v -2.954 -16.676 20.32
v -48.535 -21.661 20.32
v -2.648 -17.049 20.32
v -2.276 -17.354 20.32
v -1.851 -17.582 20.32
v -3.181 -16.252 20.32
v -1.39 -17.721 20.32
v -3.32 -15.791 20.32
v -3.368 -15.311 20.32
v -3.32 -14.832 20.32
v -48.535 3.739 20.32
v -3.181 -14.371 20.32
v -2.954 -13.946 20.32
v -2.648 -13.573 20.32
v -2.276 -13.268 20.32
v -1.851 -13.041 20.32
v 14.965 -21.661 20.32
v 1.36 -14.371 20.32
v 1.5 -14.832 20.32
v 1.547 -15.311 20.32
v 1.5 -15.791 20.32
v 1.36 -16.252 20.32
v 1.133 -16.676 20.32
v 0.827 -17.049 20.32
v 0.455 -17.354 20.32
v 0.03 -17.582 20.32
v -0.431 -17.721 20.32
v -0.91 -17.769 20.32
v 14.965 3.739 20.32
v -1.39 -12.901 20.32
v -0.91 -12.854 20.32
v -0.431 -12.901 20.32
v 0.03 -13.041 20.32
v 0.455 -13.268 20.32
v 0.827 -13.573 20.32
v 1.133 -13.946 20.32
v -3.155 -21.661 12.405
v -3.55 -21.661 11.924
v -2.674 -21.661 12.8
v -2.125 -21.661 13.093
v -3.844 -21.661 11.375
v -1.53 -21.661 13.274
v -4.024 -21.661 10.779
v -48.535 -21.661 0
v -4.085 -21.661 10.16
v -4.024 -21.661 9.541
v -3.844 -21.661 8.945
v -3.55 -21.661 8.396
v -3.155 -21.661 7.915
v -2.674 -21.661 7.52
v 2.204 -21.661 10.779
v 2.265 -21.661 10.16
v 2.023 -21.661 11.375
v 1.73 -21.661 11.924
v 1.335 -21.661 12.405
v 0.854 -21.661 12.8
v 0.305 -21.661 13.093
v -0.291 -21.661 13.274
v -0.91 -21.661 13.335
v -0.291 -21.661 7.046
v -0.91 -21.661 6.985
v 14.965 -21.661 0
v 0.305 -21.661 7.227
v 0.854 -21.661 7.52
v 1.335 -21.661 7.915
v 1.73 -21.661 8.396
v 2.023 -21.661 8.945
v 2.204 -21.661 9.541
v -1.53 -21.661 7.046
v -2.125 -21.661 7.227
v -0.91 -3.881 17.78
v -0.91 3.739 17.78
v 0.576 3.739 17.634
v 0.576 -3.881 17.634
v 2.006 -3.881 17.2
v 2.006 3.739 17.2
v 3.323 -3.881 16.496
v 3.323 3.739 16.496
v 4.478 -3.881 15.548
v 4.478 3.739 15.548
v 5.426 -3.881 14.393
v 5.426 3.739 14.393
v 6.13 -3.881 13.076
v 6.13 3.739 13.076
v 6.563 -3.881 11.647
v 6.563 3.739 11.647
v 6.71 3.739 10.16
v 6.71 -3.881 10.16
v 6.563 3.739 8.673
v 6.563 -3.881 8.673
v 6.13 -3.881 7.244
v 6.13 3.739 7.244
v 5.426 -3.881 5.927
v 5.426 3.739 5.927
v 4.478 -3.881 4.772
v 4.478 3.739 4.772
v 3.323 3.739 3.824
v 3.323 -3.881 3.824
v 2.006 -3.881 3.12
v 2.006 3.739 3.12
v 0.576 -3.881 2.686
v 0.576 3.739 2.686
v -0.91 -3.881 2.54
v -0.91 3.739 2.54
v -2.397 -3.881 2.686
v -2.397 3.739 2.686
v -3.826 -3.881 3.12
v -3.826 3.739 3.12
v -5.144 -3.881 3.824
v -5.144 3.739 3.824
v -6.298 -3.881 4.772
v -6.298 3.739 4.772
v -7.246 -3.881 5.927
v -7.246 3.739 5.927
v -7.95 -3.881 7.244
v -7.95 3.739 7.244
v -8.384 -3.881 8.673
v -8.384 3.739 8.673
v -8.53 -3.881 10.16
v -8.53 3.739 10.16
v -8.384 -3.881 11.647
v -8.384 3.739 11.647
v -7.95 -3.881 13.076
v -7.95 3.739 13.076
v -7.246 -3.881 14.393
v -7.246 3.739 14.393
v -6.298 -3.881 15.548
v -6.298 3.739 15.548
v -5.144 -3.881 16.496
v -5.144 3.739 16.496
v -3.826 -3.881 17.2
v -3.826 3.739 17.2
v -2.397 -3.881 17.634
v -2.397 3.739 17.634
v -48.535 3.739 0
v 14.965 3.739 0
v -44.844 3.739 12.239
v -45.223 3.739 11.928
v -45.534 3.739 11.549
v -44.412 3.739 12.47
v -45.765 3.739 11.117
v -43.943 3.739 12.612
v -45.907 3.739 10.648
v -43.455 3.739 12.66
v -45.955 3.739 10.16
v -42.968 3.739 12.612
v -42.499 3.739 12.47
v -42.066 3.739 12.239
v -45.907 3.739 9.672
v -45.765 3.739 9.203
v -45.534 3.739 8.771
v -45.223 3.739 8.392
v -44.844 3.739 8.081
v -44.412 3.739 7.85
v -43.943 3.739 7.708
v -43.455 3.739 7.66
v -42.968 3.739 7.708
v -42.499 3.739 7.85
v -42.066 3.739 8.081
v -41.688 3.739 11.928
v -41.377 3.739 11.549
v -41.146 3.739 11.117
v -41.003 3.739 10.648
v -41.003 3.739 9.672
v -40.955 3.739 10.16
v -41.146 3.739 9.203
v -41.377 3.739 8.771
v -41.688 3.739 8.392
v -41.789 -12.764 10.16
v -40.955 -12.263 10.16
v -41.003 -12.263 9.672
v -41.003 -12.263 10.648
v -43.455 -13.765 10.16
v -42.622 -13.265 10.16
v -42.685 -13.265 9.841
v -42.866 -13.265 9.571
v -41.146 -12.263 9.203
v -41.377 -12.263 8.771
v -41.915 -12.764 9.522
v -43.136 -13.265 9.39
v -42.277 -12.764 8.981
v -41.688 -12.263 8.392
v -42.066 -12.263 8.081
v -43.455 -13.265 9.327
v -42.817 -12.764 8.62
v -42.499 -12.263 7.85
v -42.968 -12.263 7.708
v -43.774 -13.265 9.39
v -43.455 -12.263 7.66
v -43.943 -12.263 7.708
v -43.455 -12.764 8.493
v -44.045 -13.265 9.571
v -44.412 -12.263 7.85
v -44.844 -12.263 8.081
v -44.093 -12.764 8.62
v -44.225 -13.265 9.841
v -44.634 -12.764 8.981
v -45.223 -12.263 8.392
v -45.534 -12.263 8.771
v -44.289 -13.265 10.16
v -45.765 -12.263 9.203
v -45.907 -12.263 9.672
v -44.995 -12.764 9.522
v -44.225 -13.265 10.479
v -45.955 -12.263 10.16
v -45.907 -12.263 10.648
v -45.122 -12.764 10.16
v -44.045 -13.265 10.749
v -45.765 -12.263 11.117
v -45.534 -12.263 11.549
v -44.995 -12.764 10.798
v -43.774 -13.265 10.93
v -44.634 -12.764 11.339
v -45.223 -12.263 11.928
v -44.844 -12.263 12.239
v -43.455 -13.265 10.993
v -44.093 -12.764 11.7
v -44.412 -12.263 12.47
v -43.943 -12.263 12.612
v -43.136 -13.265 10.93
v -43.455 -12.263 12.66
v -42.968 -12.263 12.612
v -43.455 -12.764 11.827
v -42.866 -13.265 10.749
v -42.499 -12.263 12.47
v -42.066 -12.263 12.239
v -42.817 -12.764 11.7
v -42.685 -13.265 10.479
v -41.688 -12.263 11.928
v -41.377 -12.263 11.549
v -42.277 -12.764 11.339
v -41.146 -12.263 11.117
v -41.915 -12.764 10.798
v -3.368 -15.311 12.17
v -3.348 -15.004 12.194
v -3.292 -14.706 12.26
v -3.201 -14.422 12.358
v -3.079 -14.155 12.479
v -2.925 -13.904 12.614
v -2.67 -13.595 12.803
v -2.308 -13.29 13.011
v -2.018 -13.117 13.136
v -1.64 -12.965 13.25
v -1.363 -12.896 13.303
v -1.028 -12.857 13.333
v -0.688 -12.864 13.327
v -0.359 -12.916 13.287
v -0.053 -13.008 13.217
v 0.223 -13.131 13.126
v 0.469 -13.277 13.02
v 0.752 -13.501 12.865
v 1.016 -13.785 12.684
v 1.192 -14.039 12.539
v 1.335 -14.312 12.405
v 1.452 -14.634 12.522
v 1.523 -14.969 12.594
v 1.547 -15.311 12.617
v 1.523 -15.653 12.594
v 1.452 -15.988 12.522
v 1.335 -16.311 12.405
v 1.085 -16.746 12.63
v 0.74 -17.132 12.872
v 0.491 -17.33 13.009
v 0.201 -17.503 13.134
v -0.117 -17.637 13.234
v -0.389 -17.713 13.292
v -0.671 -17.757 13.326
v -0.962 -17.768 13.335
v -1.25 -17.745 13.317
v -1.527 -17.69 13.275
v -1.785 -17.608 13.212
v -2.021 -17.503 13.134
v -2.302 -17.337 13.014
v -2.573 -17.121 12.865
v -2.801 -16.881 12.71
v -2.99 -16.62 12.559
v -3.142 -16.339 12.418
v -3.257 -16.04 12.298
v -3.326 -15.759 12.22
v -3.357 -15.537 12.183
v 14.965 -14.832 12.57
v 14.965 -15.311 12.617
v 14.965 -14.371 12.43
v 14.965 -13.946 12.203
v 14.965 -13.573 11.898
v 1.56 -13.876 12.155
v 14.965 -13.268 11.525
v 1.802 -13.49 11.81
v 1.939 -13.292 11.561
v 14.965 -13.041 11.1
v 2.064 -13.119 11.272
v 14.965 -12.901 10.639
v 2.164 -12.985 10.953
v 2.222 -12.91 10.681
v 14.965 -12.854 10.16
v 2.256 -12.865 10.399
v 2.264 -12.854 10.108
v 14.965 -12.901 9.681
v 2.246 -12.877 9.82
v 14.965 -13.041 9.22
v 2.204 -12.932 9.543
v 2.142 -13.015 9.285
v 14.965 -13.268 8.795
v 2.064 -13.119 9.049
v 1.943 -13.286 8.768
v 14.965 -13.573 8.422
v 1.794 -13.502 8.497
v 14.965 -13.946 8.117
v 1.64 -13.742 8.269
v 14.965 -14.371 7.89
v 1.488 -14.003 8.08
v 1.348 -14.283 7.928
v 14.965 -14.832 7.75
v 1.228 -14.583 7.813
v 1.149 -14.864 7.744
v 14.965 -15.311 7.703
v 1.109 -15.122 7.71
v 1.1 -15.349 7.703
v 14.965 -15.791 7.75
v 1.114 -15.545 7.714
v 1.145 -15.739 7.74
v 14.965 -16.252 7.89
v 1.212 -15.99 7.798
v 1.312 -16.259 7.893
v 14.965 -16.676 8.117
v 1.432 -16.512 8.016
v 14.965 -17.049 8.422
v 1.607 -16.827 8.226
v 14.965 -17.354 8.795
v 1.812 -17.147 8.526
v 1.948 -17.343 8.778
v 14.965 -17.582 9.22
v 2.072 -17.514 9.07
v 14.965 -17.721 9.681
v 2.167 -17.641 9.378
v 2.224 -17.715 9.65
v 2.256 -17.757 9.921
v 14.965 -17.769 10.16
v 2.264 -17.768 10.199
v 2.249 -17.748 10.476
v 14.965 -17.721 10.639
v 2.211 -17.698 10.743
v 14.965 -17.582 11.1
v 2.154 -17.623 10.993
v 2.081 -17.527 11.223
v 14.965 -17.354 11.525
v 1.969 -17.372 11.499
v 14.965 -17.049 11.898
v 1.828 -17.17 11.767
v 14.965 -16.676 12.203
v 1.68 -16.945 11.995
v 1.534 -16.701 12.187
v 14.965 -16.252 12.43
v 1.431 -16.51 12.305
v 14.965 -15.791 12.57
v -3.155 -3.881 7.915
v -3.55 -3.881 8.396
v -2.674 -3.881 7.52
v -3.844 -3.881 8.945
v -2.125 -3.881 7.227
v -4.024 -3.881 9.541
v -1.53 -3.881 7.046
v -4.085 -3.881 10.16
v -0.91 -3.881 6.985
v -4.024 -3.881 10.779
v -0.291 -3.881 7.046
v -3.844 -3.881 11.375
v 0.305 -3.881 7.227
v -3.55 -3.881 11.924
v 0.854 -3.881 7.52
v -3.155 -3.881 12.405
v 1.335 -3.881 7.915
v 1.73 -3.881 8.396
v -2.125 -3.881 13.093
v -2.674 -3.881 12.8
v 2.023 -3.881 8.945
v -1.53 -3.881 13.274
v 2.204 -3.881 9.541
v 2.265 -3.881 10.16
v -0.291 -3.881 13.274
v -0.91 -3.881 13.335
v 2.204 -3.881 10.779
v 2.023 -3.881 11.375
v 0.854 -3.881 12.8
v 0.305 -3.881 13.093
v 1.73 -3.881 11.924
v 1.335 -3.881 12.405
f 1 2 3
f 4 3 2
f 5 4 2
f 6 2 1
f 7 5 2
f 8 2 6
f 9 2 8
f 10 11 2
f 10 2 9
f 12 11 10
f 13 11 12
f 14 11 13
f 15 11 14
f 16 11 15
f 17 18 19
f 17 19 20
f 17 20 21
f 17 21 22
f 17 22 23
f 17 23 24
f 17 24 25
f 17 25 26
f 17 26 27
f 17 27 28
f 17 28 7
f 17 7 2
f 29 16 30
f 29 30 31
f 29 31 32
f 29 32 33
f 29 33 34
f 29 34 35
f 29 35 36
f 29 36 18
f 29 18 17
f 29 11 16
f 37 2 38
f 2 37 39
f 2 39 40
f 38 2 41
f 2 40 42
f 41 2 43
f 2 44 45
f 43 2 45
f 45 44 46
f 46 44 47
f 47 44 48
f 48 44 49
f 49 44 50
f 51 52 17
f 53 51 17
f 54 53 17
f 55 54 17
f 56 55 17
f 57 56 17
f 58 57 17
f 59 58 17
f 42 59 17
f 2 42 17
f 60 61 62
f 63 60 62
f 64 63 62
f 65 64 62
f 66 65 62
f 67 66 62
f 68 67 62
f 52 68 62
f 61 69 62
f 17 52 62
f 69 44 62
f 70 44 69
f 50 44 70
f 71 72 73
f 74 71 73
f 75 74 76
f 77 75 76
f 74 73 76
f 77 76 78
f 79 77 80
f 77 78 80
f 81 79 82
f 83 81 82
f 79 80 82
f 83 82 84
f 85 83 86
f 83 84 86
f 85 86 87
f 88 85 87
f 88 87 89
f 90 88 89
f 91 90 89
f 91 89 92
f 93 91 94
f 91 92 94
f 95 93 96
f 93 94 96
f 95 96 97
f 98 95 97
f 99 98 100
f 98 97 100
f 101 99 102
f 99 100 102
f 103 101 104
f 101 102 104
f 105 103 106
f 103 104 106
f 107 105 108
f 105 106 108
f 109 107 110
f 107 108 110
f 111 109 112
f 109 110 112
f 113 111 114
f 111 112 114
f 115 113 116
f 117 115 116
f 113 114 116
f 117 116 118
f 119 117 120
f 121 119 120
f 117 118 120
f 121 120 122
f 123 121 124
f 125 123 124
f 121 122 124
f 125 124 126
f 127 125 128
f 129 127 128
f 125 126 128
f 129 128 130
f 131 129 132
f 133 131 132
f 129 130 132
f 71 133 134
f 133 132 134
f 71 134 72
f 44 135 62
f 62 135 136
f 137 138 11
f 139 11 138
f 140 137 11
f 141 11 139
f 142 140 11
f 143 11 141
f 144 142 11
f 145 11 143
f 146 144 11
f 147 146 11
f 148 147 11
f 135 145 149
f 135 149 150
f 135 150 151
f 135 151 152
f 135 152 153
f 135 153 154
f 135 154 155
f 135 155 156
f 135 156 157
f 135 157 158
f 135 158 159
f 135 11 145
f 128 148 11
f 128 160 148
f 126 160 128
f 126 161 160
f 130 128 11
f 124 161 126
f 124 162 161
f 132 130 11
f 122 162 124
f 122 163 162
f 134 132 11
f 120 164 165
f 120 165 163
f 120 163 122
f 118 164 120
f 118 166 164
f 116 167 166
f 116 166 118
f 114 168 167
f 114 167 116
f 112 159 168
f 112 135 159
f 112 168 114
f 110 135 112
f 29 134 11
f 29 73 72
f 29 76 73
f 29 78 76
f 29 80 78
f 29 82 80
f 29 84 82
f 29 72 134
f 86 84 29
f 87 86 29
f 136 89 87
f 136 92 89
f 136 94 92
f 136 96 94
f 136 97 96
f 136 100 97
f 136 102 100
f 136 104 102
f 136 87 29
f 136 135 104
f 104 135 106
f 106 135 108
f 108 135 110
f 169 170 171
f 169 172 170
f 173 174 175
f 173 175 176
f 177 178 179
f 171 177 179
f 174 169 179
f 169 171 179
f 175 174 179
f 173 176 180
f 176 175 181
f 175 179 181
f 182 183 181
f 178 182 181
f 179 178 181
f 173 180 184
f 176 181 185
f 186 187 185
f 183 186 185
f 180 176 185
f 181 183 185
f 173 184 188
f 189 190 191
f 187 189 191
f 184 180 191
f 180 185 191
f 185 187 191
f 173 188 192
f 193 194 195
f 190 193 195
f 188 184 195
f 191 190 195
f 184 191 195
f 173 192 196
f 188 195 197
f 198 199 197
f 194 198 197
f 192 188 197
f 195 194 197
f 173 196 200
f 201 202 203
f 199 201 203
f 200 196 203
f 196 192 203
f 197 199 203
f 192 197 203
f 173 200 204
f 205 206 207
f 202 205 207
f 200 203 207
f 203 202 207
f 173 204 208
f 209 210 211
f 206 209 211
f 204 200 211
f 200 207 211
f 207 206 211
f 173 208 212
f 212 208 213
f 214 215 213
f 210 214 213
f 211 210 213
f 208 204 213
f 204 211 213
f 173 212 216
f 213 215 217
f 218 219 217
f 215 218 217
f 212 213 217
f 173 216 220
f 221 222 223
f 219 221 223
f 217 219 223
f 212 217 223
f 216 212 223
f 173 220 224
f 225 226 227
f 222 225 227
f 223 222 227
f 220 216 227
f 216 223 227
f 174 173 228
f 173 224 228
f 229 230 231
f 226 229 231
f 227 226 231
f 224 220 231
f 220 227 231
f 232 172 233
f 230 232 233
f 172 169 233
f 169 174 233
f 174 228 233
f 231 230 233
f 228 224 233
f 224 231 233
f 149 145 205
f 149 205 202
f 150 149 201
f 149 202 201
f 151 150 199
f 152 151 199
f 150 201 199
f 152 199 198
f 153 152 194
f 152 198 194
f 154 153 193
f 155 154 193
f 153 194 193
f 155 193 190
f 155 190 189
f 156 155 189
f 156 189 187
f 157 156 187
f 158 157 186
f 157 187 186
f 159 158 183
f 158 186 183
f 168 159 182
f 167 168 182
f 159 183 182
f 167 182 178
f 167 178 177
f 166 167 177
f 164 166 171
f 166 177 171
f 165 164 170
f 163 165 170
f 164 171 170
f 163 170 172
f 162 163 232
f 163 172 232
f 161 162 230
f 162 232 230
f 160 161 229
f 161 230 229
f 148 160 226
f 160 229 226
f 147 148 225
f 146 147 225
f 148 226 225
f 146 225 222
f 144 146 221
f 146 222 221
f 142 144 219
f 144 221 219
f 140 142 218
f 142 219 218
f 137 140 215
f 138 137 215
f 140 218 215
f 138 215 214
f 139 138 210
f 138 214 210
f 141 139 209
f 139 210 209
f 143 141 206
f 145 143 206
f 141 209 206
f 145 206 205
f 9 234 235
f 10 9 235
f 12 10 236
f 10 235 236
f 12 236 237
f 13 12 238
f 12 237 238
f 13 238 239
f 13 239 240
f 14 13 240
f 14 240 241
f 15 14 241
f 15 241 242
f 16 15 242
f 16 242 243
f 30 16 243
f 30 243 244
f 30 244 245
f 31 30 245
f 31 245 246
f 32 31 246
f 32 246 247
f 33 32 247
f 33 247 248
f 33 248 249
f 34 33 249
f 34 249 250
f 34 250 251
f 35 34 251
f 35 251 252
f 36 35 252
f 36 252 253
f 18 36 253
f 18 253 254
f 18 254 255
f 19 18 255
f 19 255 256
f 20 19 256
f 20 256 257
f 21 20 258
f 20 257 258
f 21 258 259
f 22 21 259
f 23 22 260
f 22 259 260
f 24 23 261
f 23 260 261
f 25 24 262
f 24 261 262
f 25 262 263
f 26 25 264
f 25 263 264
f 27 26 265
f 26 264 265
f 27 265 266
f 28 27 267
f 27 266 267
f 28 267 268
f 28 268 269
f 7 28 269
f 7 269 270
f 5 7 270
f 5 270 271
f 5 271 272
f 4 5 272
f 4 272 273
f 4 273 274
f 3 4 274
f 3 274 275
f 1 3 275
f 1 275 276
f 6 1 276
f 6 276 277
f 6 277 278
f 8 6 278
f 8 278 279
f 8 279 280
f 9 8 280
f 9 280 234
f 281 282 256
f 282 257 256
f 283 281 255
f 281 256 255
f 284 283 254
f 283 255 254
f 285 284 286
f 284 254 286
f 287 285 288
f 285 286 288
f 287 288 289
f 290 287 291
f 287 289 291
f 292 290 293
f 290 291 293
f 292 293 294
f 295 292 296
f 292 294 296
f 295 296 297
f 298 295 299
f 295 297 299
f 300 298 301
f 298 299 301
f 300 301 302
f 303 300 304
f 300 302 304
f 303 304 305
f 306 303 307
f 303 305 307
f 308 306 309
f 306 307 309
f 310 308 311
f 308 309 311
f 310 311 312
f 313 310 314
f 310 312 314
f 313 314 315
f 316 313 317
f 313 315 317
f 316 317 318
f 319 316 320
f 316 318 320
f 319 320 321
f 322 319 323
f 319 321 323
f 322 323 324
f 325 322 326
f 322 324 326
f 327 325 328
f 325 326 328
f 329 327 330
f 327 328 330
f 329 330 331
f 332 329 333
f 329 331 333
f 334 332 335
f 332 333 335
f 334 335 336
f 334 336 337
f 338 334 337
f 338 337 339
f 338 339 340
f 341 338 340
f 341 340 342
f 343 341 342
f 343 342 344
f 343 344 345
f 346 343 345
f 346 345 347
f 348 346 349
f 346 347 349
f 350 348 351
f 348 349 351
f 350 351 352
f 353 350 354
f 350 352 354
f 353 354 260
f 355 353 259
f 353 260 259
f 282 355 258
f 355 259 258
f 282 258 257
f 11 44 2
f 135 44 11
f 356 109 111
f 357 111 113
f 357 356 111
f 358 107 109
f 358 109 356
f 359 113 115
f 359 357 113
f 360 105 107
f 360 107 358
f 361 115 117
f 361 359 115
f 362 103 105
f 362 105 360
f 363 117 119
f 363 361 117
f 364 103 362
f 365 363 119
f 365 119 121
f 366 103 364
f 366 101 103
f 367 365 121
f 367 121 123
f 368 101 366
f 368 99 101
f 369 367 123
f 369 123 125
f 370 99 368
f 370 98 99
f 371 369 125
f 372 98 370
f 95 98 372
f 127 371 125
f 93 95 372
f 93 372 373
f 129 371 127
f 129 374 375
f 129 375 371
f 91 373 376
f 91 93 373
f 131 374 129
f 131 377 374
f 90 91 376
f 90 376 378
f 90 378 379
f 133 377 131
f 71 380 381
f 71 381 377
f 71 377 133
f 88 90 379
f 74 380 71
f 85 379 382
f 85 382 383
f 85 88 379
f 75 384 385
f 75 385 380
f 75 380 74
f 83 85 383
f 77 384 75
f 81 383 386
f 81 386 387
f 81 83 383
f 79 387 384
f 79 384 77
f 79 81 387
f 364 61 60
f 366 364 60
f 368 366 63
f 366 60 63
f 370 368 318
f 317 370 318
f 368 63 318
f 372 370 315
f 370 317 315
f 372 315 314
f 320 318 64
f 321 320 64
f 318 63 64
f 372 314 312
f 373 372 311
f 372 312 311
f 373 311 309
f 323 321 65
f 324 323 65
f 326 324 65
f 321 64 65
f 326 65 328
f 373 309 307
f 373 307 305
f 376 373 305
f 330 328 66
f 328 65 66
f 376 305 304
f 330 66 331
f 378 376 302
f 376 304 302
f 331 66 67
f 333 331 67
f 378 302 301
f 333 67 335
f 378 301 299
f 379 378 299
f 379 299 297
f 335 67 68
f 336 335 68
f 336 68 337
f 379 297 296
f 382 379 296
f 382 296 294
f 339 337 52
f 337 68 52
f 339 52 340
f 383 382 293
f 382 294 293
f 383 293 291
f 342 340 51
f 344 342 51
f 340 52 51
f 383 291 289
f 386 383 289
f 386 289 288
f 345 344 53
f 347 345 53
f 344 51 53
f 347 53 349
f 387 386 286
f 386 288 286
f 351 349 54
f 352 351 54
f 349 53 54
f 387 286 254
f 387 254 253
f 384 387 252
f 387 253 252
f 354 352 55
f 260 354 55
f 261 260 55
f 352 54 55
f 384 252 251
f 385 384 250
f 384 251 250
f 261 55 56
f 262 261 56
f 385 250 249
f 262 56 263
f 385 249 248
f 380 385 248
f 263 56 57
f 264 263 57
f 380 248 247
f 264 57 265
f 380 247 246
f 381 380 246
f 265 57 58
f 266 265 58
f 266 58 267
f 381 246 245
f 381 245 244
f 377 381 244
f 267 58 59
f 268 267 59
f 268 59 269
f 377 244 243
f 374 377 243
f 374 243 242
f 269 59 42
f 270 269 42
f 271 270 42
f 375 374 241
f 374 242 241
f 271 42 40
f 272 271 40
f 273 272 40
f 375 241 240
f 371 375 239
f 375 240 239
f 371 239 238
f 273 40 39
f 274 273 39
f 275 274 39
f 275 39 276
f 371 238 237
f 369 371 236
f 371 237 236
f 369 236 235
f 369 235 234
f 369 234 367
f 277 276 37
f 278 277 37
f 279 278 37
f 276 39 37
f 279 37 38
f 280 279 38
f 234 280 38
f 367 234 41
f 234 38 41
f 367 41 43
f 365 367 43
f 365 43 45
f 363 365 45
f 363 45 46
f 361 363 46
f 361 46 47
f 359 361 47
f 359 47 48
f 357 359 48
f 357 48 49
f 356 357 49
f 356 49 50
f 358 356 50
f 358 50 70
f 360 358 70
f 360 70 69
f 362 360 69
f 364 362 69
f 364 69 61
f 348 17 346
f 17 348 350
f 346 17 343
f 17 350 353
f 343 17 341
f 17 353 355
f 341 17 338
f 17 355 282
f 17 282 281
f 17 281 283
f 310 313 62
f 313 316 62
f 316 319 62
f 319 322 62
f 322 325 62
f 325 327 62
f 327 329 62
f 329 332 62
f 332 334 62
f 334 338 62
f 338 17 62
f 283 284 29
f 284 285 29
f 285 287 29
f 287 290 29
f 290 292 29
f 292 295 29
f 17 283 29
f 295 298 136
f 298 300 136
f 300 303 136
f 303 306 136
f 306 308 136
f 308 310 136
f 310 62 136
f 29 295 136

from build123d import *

# Parameters (mm, degrees)
SKETCH1_W                        = 63.5
SKETCH1_H                        = 25.4
BOSS_EXTRUDE1_DEPTH              = 20.32
F_10_0_1935_DIAMETER_HOLE1_D     = 4.9149
F_10_0_1935_DIAMETER_HOLE1_DEPTH = 15.875
F_10_0_1935_DIAMETER_HOLE1_TIP   = 1.476584928
F_10_0_1935_DIAMETER_HOLE2_D     = 4.9149
F_10_0_1935_DIAMETER_HOLE2_DEPTH = 10.16
F_10_0_1935_DIAMETER_HOLE2_TIP   = 1.476584928
SKETCH6_R                        = 3.175
CUT_EXTRUDE1_DEPTH               = 59.427173695
SKETCH7_R                        = 7.62
CUT_EXTRUDE2_DEPTH               = 7.62
TAP_DRILL_FOR_M6X1_0_TAP1_D      = 5
TAP_DRILL_FOR_M6X1_0_TAP1_DEPTH  = 16.002
TAP_DRILL_FOR_M6X1_0_TAP1_TIP    = 1.502151548


with BuildPart() as part:
    # Sketch1 → Boss-Extrude1 (new body)
    with BuildSketch(Plane.XY):
        with Locations((-16.785267857, -8.961160714)):
            Rectangle(SKETCH1_W, SKETCH1_H)
    extrude(amount=BOSS_EXTRUDE1_DEPTH)

    # #10 (0.1935) Diameter Hole1
    with Locations(Plane(origin=(14.964732143, 0, 0), x_dir=(0, 0, -1), z_dir=(1, 0, 0))):
        with Locations((-10.16, -15.311160714)):
            Hole(F_10_0_1935_DIAMETER_HOLE1_D / 2, depth=F_10_0_1935_DIAMETER_HOLE1_DEPTH)
            with Locations((0, 0, -(F_10_0_1935_DIAMETER_HOLE1_DEPTH + F_10_0_1935_DIAMETER_HOLE1_TIP / 2))):  # 118° drill point
                Cone(0, F_10_0_1935_DIAMETER_HOLE1_D / 2, F_10_0_1935_DIAMETER_HOLE1_TIP, mode=Mode.SUBTRACT)

    # #10 (0.1935) Diameter Hole2
    with Locations(Plane.XY.offset(20.32)):
        with Locations((-0.910267857, -15.311160714)):
            Hole(F_10_0_1935_DIAMETER_HOLE2_D / 2, depth=F_10_0_1935_DIAMETER_HOLE2_DEPTH)
            with Locations((0, 0, -(F_10_0_1935_DIAMETER_HOLE2_DEPTH + F_10_0_1935_DIAMETER_HOLE2_TIP / 2))):  # 118° drill point
                Cone(0, F_10_0_1935_DIAMETER_HOLE2_D / 2, F_10_0_1935_DIAMETER_HOLE2_TIP, mode=Mode.SUBTRACT)

    # Sketch6 → Cut-Extrude1 (cut, through all)
    with BuildSketch(Plane(origin=(0, -21.661160714, 0), x_dir=(-1, 0, 0), z_dir=(0, -1, 0))):
        with Locations(Location((0.910267857, -10.16, 0), (0, 0, 90))):
            Circle(SKETCH6_R)
    extrude(amount=-CUT_EXTRUDE1_DEPTH, mode=Mode.SUBTRACT)

    # Sketch7 → Cut-Extrude2 (cut)
    with BuildSketch(Plane(origin=(0, 3.738839286, 0), x_dir=(1, 0, 0), z_dir=(0, 1, 0))):
        with Locations(Location((-0.910267857, -10.16, 0), (0, 0, 270))):
            Circle(SKETCH7_R)
    extrude(amount=-CUT_EXTRUDE2_DEPTH, mode=Mode.SUBTRACT)

    # Tap Drill for M6x1.0 Tap1
    with Locations(Plane(origin=(0, 3.738839286, 0), x_dir=(1, 0, 0), z_dir=(0, 1, 0))):
        with Locations((-43.455267857, -10.16)):
            Hole(TAP_DRILL_FOR_M6X1_0_TAP1_D / 2, depth=TAP_DRILL_FOR_M6X1_0_TAP1_DEPTH)
            with Locations((0, 0, -(TAP_DRILL_FOR_M6X1_0_TAP1_DEPTH + TAP_DRILL_FOR_M6X1_0_TAP1_TIP / 2))):  # 118° drill point
                Cone(0, TAP_DRILL_FOR_M6X1_0_TAP1_D / 2, TAP_DRILL_FOR_M6X1_0_TAP1_TIP, mode=Mode.SUBTRACT)


solid = part.part
